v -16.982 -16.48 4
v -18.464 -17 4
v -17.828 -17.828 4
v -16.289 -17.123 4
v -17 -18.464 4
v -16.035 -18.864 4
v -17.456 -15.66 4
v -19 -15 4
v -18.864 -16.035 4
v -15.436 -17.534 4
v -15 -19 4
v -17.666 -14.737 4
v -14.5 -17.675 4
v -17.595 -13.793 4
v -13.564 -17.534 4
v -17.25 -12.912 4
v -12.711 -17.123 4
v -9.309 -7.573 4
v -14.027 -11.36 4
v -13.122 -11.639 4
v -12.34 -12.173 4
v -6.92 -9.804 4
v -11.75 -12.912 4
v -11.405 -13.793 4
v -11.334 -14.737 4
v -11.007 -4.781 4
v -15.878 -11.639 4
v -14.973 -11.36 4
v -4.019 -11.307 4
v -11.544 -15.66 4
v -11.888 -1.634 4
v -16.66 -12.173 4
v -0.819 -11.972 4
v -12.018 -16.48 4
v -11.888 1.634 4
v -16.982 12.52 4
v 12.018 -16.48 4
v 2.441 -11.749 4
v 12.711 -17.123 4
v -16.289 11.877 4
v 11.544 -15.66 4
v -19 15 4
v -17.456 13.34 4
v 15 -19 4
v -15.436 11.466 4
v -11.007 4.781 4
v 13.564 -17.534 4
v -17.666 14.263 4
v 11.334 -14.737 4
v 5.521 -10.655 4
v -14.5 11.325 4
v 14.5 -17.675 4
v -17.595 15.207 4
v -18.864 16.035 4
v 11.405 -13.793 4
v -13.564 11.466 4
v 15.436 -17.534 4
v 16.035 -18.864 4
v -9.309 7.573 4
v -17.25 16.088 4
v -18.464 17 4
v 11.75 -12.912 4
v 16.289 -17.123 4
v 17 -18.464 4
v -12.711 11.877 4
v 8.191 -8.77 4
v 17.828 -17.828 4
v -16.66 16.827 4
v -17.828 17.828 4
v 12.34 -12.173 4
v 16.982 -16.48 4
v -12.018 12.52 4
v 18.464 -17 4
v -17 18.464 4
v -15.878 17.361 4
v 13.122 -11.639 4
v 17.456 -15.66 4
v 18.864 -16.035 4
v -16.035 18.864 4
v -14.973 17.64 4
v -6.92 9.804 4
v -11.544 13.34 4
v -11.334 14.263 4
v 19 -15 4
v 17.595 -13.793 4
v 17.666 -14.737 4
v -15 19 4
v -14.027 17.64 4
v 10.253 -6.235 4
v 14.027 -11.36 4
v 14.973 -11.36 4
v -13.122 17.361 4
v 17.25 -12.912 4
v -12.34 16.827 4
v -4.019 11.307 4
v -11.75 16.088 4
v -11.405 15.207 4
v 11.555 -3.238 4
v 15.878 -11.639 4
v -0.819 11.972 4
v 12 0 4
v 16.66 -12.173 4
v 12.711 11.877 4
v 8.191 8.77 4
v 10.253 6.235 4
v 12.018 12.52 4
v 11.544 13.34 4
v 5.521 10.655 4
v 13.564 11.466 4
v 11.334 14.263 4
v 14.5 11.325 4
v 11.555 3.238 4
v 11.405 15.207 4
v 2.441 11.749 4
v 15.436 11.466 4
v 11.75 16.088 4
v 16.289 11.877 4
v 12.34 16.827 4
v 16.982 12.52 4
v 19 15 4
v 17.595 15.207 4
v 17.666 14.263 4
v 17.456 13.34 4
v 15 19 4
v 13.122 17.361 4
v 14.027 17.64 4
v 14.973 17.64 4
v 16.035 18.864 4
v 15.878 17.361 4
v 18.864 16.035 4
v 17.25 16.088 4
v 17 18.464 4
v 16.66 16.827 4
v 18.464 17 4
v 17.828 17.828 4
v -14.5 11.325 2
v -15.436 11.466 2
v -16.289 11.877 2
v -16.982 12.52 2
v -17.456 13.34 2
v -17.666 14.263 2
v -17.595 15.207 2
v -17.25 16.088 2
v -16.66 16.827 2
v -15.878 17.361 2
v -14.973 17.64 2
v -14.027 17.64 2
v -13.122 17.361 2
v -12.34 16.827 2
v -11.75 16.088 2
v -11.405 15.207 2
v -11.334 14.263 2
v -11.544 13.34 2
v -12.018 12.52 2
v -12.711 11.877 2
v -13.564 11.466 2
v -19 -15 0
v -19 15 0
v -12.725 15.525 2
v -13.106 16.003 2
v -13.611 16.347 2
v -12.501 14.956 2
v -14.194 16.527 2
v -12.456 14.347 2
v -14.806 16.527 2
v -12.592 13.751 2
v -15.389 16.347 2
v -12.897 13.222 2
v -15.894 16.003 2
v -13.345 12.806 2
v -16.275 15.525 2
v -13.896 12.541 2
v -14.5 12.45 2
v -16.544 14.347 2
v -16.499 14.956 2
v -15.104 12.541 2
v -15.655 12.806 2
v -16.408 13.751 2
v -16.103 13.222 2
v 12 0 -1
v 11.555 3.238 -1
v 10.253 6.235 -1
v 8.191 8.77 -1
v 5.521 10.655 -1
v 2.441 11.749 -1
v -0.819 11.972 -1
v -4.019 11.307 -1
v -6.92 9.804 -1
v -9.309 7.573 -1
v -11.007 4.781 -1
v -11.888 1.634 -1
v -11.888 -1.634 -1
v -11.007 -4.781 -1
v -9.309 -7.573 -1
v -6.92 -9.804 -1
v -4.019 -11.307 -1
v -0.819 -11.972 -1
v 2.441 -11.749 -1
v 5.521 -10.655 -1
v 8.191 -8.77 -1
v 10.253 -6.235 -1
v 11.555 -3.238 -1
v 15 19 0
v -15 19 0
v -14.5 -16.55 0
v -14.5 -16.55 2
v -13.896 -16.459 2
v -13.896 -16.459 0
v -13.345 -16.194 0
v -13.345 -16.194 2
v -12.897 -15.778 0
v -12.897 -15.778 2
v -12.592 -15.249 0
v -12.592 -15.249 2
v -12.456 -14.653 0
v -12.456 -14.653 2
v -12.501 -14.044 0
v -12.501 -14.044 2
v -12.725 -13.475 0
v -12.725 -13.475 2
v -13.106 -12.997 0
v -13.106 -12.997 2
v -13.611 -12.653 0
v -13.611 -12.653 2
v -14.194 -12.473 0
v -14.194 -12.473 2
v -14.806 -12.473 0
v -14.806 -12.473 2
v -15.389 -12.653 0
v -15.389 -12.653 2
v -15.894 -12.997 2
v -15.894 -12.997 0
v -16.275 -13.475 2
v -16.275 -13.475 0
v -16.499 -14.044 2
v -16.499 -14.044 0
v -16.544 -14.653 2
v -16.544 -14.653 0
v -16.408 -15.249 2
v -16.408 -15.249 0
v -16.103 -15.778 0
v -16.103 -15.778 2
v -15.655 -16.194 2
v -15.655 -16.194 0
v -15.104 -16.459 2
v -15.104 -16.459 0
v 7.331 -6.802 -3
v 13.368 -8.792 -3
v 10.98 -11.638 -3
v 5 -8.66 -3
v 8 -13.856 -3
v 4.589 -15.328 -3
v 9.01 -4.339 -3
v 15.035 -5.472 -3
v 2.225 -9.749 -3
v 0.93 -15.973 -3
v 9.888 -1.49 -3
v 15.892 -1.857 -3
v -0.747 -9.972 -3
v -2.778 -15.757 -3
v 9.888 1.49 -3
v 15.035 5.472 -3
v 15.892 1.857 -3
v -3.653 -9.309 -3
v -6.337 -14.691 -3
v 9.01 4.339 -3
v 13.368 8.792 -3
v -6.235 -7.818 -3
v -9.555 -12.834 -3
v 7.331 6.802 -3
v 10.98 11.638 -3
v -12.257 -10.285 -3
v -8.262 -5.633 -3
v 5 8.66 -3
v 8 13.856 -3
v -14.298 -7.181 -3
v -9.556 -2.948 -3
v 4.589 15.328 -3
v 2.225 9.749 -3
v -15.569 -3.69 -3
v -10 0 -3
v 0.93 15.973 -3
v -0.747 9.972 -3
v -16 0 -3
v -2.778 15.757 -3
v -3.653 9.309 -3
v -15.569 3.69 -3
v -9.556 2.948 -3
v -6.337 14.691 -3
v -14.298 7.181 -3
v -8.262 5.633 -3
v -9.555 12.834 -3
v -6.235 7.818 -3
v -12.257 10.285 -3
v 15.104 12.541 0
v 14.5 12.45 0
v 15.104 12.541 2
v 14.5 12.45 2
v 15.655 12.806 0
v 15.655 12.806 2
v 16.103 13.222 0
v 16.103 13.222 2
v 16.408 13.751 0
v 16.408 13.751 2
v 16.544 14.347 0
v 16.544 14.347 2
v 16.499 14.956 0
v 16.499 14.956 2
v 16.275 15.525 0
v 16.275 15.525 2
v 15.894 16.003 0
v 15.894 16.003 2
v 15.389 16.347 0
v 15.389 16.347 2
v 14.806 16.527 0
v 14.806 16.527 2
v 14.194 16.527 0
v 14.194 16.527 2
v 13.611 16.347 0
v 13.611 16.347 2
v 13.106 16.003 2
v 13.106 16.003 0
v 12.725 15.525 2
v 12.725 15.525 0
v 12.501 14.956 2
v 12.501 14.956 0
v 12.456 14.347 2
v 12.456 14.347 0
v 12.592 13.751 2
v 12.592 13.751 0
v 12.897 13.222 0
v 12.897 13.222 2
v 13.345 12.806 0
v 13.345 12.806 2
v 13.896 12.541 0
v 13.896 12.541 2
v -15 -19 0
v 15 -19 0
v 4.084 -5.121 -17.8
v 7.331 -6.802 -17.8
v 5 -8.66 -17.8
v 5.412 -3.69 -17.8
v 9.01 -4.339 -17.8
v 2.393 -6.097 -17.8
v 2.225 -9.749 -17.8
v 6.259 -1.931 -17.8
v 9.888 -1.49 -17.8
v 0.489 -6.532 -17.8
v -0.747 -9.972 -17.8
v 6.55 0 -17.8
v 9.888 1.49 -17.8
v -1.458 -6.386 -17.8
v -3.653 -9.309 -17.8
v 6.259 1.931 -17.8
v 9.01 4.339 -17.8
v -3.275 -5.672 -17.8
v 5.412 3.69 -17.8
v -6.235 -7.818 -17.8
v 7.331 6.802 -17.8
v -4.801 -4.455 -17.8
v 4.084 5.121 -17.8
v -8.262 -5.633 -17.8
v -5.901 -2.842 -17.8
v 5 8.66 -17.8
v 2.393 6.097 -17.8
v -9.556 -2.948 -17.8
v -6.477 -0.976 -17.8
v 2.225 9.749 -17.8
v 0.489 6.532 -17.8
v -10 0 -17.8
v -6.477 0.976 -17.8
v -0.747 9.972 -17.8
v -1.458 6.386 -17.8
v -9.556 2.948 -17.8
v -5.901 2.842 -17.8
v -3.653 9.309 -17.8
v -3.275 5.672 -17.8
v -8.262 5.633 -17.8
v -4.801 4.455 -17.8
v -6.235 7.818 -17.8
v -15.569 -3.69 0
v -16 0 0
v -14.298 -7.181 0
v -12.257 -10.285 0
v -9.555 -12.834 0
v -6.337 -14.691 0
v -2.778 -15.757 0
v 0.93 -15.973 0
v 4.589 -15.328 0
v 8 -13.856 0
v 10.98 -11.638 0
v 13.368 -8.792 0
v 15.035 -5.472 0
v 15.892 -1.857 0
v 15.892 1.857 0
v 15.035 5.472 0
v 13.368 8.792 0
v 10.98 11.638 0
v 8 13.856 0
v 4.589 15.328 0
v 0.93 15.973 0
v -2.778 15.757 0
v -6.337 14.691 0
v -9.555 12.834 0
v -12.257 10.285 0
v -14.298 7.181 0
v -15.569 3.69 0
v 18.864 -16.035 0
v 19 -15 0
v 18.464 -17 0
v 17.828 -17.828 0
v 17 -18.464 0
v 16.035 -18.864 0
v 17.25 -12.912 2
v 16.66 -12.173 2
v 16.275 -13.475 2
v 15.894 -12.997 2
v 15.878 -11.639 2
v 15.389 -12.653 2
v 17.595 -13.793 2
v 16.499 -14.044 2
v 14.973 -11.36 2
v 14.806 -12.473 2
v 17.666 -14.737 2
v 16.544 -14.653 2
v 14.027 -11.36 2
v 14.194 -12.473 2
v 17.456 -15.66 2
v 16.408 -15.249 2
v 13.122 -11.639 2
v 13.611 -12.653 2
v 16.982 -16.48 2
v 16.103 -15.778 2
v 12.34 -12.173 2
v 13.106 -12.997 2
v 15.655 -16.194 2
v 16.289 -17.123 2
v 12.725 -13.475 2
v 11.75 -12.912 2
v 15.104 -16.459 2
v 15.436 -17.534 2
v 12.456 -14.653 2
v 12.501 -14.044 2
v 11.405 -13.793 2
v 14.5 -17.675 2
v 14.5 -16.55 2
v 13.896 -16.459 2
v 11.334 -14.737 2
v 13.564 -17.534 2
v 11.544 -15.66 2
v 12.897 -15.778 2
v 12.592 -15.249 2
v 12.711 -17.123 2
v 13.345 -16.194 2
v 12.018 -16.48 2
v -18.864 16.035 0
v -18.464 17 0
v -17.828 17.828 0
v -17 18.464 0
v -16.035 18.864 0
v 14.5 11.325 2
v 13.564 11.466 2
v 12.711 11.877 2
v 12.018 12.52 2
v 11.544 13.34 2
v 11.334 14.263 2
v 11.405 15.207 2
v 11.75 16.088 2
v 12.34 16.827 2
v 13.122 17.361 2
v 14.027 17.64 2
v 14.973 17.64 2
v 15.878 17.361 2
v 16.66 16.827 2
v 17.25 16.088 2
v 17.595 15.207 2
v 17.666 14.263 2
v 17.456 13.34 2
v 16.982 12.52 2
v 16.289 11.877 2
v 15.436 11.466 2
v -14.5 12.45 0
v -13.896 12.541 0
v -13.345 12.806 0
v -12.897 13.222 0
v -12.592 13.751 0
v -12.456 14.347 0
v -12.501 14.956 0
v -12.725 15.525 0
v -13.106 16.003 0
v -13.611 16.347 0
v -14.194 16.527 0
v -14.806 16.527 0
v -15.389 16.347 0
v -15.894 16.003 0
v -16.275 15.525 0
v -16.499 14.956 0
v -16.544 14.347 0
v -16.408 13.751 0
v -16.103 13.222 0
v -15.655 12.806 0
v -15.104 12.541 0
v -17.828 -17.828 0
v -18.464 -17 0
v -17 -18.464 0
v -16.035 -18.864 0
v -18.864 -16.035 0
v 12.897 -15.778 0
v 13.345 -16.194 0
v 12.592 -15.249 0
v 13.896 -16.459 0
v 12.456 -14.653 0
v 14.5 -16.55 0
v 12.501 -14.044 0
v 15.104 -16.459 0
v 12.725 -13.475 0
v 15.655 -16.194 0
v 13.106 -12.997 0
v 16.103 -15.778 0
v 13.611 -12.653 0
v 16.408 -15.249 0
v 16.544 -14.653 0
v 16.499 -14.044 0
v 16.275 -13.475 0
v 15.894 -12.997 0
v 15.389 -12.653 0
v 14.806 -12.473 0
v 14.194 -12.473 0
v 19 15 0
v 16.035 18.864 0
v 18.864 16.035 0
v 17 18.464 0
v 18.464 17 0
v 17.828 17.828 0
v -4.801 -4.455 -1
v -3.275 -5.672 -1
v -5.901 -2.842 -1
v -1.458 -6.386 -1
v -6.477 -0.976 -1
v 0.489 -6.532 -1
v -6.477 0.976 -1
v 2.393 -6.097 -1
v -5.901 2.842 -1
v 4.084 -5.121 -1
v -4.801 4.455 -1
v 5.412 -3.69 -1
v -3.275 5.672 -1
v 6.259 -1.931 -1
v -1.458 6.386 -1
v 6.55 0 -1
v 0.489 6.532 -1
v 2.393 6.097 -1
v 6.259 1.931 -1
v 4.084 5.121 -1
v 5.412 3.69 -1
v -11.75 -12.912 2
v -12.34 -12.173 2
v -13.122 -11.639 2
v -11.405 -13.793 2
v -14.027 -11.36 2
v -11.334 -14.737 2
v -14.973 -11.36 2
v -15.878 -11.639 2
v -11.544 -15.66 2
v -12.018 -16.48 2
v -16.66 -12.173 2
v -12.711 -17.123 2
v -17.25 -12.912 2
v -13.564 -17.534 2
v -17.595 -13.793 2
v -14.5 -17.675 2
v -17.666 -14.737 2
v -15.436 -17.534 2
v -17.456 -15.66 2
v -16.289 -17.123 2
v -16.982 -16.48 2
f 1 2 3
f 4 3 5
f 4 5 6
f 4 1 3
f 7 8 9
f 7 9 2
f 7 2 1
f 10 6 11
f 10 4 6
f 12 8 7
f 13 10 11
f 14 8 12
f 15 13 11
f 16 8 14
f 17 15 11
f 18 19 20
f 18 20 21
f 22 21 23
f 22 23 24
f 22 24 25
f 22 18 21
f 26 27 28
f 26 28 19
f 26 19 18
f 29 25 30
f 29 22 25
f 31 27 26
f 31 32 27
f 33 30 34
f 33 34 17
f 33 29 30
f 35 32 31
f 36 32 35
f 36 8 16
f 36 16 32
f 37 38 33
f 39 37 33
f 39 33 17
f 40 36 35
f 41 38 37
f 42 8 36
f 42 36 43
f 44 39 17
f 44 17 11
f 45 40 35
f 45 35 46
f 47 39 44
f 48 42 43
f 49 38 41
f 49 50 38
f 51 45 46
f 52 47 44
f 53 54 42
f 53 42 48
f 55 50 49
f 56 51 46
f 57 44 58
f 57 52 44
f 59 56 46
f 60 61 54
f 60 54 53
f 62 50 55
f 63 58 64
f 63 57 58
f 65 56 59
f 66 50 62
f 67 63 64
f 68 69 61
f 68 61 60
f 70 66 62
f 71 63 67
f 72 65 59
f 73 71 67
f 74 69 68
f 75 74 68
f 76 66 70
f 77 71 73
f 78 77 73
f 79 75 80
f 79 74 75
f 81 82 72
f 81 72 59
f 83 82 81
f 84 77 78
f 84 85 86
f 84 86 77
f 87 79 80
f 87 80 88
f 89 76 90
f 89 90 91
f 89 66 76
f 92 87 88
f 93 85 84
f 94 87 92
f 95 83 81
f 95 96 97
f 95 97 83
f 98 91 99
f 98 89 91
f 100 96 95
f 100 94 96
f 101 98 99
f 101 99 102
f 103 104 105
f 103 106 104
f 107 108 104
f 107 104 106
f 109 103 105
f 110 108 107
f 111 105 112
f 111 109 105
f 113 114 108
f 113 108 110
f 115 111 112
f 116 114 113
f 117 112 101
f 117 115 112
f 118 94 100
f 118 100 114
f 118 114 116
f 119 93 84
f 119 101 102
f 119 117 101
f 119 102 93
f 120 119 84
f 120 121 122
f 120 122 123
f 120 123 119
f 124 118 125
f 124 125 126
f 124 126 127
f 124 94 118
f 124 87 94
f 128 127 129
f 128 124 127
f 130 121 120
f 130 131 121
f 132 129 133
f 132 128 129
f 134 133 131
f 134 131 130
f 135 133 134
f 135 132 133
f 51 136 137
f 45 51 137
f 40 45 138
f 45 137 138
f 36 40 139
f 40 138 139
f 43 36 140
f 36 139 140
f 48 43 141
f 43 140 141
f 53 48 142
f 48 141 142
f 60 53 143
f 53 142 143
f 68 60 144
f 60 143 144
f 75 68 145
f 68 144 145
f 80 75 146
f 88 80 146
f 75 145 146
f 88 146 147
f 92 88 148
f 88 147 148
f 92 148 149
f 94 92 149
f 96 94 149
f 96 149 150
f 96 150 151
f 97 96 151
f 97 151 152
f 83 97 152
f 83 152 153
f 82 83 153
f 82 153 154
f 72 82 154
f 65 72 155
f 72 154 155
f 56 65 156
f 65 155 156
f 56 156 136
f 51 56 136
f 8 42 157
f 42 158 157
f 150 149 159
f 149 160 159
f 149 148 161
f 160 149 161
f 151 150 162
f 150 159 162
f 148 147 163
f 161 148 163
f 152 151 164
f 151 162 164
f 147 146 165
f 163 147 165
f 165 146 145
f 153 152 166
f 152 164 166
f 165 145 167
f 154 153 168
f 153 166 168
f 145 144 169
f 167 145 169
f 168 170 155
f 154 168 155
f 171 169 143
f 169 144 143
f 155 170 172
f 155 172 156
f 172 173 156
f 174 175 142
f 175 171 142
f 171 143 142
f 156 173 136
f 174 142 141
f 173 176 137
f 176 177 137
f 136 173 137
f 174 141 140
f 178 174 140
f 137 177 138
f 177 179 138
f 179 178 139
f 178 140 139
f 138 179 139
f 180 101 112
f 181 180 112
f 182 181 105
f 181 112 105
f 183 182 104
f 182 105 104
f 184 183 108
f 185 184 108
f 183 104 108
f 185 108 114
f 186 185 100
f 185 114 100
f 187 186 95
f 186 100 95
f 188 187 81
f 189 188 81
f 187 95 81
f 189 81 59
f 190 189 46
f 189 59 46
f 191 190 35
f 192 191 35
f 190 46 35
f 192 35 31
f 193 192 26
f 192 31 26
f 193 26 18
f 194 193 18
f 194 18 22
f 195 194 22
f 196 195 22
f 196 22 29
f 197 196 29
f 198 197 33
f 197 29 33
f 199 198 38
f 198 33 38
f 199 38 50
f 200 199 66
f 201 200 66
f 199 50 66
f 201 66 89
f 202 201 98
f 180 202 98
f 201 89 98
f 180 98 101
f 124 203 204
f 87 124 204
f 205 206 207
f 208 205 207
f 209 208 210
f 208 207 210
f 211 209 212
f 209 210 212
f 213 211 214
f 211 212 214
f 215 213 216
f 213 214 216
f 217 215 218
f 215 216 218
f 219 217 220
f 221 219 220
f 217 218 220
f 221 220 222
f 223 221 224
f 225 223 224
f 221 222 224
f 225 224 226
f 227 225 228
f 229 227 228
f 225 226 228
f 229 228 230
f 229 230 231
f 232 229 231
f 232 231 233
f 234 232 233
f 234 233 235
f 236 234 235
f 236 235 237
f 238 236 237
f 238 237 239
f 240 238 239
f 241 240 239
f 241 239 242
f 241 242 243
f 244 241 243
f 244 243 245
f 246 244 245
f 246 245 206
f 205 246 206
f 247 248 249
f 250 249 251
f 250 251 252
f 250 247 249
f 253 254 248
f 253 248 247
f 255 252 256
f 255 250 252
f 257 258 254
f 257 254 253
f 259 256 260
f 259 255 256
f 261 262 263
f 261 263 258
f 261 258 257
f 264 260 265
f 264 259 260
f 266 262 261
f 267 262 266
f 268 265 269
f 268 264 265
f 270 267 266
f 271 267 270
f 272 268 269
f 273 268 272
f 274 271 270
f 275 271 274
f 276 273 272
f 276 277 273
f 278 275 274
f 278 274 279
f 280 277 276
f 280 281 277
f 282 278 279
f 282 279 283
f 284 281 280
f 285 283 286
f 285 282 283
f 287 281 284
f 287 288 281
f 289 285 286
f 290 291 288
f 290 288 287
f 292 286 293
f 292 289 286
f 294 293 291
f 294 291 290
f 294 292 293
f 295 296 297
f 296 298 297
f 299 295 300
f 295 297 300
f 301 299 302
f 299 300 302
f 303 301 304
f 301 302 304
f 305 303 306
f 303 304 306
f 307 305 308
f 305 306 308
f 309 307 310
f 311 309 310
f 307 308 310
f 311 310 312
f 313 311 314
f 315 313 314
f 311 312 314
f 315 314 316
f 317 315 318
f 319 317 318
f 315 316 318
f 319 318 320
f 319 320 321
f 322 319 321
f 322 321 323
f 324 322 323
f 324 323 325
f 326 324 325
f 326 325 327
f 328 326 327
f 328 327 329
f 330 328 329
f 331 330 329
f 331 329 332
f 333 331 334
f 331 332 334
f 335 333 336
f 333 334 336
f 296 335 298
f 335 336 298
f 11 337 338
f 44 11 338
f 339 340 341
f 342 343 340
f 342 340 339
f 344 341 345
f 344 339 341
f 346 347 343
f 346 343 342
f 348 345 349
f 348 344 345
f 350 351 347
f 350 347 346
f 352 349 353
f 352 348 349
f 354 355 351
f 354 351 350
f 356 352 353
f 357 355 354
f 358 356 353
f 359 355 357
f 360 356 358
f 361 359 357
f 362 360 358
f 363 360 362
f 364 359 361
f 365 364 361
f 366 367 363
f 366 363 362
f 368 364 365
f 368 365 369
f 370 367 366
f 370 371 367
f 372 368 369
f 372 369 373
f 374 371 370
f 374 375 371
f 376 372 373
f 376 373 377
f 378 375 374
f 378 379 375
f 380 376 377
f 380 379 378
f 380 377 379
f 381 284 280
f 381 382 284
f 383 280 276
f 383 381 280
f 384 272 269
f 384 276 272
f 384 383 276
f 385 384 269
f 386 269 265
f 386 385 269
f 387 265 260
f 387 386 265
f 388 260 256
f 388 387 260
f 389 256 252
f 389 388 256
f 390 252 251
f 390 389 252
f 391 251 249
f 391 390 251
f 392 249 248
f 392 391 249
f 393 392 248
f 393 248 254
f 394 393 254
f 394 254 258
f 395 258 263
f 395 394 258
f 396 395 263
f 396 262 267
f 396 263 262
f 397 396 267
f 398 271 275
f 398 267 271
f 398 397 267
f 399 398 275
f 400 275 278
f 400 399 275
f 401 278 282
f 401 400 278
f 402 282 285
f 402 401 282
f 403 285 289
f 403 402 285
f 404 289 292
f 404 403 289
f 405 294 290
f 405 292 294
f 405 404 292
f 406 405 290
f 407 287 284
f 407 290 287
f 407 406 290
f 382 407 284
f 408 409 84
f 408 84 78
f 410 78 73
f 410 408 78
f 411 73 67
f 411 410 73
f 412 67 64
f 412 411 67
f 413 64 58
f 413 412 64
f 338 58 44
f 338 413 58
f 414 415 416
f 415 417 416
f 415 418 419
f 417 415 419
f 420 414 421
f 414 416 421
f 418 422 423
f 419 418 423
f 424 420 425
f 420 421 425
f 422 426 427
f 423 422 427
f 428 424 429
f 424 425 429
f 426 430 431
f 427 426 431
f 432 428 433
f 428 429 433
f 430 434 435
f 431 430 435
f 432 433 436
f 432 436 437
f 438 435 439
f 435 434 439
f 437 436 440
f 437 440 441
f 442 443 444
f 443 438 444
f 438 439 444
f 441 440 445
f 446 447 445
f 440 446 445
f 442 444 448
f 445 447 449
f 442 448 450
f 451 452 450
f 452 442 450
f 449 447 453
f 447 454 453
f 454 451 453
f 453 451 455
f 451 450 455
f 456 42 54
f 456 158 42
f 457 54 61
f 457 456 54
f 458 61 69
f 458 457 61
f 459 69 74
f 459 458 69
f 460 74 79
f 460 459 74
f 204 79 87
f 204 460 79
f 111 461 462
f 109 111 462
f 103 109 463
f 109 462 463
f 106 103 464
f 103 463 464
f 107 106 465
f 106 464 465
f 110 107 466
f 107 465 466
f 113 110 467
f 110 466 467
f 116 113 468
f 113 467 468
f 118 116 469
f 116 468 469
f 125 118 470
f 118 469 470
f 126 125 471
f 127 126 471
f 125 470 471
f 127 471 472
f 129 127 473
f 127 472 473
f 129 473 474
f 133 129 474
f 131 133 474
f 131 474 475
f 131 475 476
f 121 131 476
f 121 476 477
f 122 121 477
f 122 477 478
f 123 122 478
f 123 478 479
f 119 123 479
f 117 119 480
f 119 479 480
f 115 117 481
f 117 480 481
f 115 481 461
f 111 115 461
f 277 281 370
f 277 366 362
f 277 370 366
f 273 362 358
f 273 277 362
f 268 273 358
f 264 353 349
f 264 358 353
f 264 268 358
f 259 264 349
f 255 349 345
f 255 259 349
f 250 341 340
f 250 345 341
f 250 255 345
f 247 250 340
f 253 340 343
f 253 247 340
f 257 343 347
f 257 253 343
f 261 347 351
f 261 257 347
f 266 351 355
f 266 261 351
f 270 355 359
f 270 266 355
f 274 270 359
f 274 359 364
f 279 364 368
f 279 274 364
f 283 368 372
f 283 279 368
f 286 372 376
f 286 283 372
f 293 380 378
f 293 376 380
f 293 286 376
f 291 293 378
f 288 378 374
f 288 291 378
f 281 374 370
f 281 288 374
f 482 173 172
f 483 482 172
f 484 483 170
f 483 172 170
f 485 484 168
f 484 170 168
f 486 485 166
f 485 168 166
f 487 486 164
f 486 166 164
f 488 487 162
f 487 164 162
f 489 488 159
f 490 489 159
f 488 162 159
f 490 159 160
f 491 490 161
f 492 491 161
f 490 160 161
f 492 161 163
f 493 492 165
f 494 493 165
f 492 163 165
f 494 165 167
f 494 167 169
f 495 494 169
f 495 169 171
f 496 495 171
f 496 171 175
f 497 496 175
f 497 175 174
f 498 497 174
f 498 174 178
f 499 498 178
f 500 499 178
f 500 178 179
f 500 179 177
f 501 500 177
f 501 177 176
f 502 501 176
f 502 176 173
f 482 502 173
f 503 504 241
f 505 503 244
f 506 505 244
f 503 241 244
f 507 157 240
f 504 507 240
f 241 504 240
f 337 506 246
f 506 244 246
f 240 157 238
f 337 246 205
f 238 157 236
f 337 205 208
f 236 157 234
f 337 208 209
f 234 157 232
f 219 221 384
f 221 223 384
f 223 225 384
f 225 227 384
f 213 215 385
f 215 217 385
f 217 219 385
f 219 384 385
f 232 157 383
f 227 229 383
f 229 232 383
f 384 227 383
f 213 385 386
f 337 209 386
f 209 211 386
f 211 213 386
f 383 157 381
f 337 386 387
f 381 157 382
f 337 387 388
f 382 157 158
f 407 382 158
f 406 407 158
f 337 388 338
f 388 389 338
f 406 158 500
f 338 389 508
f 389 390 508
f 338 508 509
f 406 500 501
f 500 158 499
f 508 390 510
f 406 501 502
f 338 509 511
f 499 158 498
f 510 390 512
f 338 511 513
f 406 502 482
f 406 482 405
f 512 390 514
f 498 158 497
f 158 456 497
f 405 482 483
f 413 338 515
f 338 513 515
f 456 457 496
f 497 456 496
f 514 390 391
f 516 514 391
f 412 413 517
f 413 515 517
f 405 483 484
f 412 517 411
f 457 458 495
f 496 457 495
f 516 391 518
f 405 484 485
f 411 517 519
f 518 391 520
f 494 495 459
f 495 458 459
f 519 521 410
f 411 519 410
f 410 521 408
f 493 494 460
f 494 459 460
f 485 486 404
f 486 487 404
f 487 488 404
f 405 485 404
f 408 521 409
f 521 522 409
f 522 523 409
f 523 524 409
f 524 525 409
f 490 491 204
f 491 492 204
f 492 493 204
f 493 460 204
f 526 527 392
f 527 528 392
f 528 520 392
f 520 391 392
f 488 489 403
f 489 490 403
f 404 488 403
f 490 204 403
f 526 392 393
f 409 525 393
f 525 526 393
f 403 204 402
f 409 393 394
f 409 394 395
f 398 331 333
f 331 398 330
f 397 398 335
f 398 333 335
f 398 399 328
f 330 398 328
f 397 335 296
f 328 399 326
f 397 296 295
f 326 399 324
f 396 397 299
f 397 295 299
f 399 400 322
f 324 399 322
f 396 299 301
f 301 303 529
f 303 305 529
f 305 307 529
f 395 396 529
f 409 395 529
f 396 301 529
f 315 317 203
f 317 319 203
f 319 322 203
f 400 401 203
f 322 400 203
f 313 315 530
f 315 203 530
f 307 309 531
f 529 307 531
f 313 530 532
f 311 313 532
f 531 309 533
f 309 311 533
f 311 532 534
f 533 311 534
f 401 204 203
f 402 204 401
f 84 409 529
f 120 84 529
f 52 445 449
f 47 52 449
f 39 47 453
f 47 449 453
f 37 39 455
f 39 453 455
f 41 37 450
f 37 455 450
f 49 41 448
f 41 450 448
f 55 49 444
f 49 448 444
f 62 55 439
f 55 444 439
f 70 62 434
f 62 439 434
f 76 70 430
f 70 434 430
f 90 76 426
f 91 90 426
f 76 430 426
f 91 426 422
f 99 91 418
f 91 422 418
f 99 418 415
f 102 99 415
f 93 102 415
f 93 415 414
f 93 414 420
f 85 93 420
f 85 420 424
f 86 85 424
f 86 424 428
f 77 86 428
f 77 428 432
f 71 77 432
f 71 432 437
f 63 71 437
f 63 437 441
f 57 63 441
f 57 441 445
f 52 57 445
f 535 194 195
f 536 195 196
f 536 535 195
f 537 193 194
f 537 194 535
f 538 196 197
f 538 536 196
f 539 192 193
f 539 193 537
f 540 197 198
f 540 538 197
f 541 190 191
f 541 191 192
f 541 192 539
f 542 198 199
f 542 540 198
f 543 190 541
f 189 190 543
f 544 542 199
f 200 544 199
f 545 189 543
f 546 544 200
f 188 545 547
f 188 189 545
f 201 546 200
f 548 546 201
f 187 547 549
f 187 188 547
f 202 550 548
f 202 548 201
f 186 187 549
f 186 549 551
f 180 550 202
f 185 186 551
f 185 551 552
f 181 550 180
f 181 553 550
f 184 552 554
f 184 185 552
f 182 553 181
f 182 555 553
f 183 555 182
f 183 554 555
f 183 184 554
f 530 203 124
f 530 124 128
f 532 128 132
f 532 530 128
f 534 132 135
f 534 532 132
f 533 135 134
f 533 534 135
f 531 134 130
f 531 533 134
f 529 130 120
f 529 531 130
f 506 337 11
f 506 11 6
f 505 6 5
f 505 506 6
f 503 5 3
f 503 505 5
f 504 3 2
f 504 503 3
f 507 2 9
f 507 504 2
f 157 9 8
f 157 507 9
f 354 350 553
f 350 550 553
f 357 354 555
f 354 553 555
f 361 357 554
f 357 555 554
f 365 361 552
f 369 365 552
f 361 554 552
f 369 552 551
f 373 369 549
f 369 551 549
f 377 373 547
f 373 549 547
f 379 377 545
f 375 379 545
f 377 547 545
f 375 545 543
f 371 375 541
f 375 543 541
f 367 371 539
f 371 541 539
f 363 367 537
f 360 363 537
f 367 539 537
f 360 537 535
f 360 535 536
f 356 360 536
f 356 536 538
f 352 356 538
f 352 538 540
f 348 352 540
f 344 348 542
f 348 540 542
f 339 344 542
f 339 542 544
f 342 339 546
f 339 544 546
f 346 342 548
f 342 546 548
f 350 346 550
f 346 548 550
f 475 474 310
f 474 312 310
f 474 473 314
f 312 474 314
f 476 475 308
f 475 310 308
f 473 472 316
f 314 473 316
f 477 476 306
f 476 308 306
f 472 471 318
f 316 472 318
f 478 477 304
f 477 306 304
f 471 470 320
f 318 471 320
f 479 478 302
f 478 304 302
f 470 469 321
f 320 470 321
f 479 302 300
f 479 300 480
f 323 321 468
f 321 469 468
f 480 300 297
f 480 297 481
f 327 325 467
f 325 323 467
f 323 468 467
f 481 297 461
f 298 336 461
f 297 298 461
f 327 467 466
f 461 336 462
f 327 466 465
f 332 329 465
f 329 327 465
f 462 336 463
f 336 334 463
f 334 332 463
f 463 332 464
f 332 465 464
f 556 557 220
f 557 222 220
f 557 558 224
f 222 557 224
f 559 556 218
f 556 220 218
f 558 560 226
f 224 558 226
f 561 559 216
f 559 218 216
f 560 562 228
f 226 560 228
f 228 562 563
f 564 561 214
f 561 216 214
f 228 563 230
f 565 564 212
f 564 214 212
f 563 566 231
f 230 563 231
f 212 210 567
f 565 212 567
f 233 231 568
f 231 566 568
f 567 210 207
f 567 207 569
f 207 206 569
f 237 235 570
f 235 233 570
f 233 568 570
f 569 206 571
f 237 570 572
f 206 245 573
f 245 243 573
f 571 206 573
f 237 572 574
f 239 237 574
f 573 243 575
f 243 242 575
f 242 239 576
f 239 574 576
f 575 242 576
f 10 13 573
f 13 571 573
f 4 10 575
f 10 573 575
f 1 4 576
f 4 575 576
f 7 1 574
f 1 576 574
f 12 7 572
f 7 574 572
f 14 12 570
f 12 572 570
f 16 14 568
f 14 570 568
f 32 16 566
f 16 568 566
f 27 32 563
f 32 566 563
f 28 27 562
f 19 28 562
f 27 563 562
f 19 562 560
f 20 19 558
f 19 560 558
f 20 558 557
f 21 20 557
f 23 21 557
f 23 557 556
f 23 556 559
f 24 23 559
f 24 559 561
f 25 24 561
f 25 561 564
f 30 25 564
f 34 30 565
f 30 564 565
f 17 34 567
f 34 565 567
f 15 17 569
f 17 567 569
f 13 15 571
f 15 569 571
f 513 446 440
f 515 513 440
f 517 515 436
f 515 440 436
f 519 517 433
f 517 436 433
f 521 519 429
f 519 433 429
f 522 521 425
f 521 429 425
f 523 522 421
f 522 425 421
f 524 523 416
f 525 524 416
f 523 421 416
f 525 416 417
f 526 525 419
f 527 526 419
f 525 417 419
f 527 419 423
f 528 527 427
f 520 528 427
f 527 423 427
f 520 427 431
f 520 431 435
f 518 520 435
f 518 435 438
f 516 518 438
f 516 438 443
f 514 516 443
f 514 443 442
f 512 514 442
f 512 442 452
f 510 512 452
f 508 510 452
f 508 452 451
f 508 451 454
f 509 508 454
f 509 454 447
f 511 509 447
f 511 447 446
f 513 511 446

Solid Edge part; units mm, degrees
sketch "Sketch1" plane through (0, 0, 0) normal (0, 0, 1) x (1, 0, 0)
  line L0 (15, 19) -> (-15, 19)
  arc A0 (-15, 19) -> (-19, 15) centre (-15, 15) ccw
  line L1 (-19, 15) -> (-19, -15)
  arc A1 (-19, -15) -> (-15, -19) centre (-15, -15) ccw
  line L2 (-15, -19) -> (15, -19)
  arc A2 (15, -19) -> (19, -15) centre (15, -15) ccw
  line L3 (19, -15) -> (19, 15)
  arc A3 (15, 19) -> (19, 15) centre (15, 15) cw
  dimension "D1" = 38
  dimension "D2" = 38
  dimension "D3" = 4
  dimension "D4" = 19
  dimension "D5" = 19
extrude "Protrusion1" add sketch "Sketch1" along normal blind 4
sketch "Sketch2" plane through (0, 0, 0) normal (0, 0, -1) x (-1, 0, 0)
  circle A0 centre (0, 0) radius 16
  dimension "D1" = 32
extrude "Protrusion2" add sketch "Sketch2" along normal blind 3
sketch "Sketch3" plane through (0, 0, -3) normal (0, 0, -1) x (-1, 0, 0)
  circle A0 centre (0, 0) radius 10
  dimension "D1" = 20
extrude "Protrusion3" add sketch "Sketch3" along normal blind 14.8
sketch "Sketch4" plane through (0, 0, 4) normal (0, 0, 1) x (1, 0, 0)
  circle A0 centre (0, 0) radius 12
  dimension "D1" = 24
extrude "Cutout1" cut sketch "Sketch4" against normal blind 5
sketch "Sketch5" plane through (0, 0, -1) normal (0, 0, 1) x (1, 0, 0)
  circle A0 centre (0, 0) radius 6.55
  dimension "D1" = 13.1
extrude "Cutout2" cut sketch "Sketch5" against normal up to next
hole "Hole_1" at (-14.5, 14.5, 4) direction (0, 0, -1) diameter 4.1 end up to next counterbore diameter 6.35 counterbore depth 2
hole "Hole1" at (14.5, 14.5, 4) direction (0, 0, -1) diameter 4.1 end up to next counterbore diameter 6.35 counterbore depth 2
hole "Hole_3" at (14.5, -14.5, 4) direction (0, 0, -1) diameter 4.1 end up to next counterbore diameter 6.35 counterbore depth 2
hole "Hole_4" at (-14.5, -14.5, 4) direction (0, 0, -1) diameter 4.1 end up to next counterbore diameter 6.35 counterbore depth 2
properties part number "PLATE1" material "410 Stainless Steel"
